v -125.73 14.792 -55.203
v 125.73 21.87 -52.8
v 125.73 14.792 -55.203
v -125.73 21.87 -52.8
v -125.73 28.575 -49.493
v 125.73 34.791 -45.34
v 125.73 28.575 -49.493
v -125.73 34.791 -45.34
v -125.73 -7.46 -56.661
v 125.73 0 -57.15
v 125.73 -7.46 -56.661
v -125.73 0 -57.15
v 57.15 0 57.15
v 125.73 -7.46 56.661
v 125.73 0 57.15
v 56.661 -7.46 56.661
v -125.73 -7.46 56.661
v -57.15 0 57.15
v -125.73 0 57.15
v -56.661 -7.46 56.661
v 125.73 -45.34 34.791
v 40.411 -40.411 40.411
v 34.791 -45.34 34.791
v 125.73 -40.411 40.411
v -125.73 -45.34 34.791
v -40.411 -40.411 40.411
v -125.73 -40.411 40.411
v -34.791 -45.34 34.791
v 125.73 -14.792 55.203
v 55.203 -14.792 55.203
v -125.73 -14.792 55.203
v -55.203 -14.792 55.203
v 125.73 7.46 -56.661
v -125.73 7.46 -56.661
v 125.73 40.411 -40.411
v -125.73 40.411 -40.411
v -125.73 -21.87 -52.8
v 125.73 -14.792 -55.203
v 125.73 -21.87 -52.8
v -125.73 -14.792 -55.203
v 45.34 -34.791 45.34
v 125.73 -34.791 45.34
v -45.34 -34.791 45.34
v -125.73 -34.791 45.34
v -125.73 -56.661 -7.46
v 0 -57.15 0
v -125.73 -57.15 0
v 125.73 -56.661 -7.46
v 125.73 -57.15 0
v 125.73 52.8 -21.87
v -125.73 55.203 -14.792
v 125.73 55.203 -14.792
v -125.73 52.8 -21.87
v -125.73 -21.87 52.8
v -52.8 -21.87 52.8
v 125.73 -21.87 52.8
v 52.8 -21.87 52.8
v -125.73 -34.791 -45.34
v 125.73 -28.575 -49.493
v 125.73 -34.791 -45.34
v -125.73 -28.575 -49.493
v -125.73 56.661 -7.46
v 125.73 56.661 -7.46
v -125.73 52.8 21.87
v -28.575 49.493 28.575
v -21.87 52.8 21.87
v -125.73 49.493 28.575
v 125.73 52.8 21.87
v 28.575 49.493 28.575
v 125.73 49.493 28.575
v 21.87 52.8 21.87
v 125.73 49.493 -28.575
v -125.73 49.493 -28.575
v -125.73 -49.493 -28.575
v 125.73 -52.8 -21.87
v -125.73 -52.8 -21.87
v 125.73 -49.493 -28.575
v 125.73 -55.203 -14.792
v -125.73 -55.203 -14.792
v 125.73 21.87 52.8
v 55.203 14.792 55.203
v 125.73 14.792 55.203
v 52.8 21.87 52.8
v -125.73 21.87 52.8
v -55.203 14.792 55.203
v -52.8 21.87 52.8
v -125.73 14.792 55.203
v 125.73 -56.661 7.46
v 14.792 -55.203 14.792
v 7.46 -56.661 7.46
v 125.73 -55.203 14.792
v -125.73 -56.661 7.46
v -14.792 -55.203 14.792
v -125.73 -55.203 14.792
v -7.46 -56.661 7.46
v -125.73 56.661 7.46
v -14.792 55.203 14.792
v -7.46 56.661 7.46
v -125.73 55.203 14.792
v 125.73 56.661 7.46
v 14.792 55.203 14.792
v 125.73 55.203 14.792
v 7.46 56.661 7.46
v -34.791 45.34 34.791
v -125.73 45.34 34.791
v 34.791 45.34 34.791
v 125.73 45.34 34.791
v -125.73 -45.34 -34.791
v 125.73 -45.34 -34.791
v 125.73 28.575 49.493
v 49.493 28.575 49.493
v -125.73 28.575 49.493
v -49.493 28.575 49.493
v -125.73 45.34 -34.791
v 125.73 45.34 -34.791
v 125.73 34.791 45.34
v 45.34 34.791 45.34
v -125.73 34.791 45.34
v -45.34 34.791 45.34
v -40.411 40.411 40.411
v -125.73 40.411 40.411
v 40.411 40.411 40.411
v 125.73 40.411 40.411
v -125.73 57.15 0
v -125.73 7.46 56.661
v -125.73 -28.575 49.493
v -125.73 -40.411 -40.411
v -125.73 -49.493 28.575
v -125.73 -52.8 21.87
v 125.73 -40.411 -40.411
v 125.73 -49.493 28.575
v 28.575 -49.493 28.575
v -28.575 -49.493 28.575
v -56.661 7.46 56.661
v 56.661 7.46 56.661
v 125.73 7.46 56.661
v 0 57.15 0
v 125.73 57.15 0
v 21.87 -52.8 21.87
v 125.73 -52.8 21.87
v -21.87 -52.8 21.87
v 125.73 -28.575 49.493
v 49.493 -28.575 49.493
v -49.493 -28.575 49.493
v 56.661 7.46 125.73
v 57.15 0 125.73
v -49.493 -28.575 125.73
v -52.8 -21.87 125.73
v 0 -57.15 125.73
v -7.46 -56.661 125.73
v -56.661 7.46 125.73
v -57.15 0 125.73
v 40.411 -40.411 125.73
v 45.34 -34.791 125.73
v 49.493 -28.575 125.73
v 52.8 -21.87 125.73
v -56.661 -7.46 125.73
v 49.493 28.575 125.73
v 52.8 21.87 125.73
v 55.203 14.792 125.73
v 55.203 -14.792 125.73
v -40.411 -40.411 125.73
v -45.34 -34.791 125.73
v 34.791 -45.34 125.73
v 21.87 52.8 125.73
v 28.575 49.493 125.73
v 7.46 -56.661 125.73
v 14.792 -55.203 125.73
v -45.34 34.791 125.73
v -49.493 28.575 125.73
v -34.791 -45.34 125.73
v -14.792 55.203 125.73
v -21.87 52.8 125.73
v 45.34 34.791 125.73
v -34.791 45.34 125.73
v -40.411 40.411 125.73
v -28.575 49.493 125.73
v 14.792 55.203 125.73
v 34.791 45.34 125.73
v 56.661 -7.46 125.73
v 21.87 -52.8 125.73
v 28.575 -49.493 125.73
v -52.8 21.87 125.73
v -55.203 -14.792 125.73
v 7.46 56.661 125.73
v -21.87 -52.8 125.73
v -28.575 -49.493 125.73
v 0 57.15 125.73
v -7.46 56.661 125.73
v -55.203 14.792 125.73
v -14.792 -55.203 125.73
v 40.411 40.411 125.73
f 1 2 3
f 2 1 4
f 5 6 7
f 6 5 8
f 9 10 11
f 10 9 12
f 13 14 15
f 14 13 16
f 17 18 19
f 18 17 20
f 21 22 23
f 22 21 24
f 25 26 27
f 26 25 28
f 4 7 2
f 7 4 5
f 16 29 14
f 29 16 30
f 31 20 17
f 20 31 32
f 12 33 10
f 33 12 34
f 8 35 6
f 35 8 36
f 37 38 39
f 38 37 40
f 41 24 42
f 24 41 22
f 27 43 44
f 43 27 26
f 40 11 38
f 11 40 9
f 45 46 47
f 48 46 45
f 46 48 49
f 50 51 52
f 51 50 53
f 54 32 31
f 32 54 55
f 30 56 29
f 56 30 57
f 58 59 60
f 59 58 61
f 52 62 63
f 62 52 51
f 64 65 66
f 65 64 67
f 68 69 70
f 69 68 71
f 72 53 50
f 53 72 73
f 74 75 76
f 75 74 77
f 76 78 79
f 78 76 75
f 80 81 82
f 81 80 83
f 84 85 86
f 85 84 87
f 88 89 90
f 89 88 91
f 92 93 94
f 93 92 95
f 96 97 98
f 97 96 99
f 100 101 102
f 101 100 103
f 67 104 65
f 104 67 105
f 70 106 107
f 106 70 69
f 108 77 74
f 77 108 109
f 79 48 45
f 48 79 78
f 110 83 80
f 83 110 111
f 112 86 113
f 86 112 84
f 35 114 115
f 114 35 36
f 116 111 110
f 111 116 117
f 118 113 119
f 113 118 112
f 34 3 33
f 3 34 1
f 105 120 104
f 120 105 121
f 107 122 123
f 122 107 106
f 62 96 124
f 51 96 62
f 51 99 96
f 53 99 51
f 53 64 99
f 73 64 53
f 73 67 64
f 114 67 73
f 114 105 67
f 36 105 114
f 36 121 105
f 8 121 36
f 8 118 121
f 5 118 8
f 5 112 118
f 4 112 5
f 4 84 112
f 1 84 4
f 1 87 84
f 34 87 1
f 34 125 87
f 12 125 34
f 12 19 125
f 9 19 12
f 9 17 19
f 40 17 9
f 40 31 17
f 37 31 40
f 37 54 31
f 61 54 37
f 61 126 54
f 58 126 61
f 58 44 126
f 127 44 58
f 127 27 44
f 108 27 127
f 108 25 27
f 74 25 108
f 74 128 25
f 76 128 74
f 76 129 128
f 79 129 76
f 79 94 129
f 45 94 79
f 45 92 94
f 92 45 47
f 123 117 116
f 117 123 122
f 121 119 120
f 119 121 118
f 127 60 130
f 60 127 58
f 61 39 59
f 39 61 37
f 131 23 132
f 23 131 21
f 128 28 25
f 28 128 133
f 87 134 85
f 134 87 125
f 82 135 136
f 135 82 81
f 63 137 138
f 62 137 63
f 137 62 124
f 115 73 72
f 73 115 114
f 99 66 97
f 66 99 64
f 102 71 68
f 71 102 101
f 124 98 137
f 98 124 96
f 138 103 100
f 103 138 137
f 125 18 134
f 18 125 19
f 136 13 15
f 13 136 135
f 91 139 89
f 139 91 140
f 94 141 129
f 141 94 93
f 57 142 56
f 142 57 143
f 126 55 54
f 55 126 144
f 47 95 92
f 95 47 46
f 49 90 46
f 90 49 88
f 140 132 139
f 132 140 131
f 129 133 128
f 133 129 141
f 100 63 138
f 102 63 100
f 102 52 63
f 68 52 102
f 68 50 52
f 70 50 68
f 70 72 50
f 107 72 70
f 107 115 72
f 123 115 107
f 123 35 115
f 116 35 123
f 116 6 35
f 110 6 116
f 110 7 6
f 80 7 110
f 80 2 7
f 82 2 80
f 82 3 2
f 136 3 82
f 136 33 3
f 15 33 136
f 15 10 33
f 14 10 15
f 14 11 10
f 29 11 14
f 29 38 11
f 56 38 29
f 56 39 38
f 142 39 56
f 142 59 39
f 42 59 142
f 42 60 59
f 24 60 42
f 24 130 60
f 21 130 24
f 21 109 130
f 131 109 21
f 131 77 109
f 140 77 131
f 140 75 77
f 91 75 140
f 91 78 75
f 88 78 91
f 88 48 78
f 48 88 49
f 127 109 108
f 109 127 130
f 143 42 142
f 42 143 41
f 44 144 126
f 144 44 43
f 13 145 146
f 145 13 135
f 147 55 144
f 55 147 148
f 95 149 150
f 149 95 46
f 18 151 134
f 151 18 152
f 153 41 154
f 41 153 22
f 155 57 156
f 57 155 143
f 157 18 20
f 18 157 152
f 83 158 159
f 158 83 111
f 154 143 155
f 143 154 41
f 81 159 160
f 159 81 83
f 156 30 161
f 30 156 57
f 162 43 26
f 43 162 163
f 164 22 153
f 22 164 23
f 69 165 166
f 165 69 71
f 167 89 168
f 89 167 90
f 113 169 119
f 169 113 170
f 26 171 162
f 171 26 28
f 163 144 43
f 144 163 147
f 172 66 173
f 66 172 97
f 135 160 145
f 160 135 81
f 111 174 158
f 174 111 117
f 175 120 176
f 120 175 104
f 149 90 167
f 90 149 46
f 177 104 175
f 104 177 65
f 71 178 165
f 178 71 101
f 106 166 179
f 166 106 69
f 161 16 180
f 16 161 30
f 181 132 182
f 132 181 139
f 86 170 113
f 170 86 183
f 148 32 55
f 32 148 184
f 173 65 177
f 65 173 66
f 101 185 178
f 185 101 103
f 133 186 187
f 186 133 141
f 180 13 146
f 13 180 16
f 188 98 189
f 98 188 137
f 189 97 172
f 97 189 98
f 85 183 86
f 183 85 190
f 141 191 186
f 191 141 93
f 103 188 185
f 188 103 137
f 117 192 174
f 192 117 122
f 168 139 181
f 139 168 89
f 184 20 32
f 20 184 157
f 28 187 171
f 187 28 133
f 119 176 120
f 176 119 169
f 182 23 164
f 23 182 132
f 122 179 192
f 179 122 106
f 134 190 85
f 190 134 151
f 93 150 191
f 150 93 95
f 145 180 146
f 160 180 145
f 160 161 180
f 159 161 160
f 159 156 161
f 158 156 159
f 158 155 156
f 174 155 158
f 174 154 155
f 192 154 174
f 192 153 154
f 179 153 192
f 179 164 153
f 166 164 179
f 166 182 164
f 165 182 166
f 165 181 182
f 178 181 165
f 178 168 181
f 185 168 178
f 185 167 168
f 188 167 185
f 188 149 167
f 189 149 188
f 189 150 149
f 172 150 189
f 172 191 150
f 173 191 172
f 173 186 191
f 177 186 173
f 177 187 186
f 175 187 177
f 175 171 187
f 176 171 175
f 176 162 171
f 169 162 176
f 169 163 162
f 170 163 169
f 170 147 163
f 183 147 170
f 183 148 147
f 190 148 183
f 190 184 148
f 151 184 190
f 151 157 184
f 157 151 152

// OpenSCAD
// Auto-generated by scripts/author_from_manifest.py (Phase D.3).
// Source: data/phase_d_manifest.json (sku_intent='victaulic-no20-tee-grooved-4in').
// Do not hand-edit — regenerate from the manifest.
//
// @part victaulic_no20_tee_grooved_4in
// @kind fitting
// @category fitting.tee
// @display-name "Victaulic No. 20 Grooved Tee 4\""
// @mfg victaulic
// @mfg-pn No._20_4in
// @listing UL FM
// @price-usd 74.00
// @install-minutes 6
// @crew journeyman
// @param size_in number default=4 label="Size" unit="in"
// @port run_in position=[-0.05,0,0] direction=[-1,0,0] style=grooved size_in=4 role=run_a
// @port run_out position=[0.05,0,0] direction=[1,0,0] style=grooved size_in=4 role=run_b
// @port branch position=[0,0,0.05] direction=[0,0,1] style=grooved size_in=4 role=branch

size_in = 4.0;

function od_mm(nps) =
    nps ==   1  ? 33.4 :
    nps == 1.25 ? 42.2 :
    nps == 1.5  ? 48.3 :
    nps ==   2  ? 60.3 :
    nps == 2.5  ? 73.0 :
    nps ==   3  ? 88.9 :
    nps ==   4  ? 114.3 :
    nps ==   5  ? 141.3 :
    nps ==   6  ? 168.3 :
    nps ==   8  ? 219.1 :
    nps ==  10  ? 273.0 : 60.3;

od = od_mm(size_in);
run_len    = od * 2.2;
branch_len = od * 1.1;

union() {
    // Run along X
    rotate([0, 90, 0])
        cylinder(h = run_len, d = od, center = true, $fn = 48);
    // Branch along +Z
    translate([0, 0, branch_len/2])
        cylinder(h = branch_len, d = od, center = true, $fn = 48);
}
